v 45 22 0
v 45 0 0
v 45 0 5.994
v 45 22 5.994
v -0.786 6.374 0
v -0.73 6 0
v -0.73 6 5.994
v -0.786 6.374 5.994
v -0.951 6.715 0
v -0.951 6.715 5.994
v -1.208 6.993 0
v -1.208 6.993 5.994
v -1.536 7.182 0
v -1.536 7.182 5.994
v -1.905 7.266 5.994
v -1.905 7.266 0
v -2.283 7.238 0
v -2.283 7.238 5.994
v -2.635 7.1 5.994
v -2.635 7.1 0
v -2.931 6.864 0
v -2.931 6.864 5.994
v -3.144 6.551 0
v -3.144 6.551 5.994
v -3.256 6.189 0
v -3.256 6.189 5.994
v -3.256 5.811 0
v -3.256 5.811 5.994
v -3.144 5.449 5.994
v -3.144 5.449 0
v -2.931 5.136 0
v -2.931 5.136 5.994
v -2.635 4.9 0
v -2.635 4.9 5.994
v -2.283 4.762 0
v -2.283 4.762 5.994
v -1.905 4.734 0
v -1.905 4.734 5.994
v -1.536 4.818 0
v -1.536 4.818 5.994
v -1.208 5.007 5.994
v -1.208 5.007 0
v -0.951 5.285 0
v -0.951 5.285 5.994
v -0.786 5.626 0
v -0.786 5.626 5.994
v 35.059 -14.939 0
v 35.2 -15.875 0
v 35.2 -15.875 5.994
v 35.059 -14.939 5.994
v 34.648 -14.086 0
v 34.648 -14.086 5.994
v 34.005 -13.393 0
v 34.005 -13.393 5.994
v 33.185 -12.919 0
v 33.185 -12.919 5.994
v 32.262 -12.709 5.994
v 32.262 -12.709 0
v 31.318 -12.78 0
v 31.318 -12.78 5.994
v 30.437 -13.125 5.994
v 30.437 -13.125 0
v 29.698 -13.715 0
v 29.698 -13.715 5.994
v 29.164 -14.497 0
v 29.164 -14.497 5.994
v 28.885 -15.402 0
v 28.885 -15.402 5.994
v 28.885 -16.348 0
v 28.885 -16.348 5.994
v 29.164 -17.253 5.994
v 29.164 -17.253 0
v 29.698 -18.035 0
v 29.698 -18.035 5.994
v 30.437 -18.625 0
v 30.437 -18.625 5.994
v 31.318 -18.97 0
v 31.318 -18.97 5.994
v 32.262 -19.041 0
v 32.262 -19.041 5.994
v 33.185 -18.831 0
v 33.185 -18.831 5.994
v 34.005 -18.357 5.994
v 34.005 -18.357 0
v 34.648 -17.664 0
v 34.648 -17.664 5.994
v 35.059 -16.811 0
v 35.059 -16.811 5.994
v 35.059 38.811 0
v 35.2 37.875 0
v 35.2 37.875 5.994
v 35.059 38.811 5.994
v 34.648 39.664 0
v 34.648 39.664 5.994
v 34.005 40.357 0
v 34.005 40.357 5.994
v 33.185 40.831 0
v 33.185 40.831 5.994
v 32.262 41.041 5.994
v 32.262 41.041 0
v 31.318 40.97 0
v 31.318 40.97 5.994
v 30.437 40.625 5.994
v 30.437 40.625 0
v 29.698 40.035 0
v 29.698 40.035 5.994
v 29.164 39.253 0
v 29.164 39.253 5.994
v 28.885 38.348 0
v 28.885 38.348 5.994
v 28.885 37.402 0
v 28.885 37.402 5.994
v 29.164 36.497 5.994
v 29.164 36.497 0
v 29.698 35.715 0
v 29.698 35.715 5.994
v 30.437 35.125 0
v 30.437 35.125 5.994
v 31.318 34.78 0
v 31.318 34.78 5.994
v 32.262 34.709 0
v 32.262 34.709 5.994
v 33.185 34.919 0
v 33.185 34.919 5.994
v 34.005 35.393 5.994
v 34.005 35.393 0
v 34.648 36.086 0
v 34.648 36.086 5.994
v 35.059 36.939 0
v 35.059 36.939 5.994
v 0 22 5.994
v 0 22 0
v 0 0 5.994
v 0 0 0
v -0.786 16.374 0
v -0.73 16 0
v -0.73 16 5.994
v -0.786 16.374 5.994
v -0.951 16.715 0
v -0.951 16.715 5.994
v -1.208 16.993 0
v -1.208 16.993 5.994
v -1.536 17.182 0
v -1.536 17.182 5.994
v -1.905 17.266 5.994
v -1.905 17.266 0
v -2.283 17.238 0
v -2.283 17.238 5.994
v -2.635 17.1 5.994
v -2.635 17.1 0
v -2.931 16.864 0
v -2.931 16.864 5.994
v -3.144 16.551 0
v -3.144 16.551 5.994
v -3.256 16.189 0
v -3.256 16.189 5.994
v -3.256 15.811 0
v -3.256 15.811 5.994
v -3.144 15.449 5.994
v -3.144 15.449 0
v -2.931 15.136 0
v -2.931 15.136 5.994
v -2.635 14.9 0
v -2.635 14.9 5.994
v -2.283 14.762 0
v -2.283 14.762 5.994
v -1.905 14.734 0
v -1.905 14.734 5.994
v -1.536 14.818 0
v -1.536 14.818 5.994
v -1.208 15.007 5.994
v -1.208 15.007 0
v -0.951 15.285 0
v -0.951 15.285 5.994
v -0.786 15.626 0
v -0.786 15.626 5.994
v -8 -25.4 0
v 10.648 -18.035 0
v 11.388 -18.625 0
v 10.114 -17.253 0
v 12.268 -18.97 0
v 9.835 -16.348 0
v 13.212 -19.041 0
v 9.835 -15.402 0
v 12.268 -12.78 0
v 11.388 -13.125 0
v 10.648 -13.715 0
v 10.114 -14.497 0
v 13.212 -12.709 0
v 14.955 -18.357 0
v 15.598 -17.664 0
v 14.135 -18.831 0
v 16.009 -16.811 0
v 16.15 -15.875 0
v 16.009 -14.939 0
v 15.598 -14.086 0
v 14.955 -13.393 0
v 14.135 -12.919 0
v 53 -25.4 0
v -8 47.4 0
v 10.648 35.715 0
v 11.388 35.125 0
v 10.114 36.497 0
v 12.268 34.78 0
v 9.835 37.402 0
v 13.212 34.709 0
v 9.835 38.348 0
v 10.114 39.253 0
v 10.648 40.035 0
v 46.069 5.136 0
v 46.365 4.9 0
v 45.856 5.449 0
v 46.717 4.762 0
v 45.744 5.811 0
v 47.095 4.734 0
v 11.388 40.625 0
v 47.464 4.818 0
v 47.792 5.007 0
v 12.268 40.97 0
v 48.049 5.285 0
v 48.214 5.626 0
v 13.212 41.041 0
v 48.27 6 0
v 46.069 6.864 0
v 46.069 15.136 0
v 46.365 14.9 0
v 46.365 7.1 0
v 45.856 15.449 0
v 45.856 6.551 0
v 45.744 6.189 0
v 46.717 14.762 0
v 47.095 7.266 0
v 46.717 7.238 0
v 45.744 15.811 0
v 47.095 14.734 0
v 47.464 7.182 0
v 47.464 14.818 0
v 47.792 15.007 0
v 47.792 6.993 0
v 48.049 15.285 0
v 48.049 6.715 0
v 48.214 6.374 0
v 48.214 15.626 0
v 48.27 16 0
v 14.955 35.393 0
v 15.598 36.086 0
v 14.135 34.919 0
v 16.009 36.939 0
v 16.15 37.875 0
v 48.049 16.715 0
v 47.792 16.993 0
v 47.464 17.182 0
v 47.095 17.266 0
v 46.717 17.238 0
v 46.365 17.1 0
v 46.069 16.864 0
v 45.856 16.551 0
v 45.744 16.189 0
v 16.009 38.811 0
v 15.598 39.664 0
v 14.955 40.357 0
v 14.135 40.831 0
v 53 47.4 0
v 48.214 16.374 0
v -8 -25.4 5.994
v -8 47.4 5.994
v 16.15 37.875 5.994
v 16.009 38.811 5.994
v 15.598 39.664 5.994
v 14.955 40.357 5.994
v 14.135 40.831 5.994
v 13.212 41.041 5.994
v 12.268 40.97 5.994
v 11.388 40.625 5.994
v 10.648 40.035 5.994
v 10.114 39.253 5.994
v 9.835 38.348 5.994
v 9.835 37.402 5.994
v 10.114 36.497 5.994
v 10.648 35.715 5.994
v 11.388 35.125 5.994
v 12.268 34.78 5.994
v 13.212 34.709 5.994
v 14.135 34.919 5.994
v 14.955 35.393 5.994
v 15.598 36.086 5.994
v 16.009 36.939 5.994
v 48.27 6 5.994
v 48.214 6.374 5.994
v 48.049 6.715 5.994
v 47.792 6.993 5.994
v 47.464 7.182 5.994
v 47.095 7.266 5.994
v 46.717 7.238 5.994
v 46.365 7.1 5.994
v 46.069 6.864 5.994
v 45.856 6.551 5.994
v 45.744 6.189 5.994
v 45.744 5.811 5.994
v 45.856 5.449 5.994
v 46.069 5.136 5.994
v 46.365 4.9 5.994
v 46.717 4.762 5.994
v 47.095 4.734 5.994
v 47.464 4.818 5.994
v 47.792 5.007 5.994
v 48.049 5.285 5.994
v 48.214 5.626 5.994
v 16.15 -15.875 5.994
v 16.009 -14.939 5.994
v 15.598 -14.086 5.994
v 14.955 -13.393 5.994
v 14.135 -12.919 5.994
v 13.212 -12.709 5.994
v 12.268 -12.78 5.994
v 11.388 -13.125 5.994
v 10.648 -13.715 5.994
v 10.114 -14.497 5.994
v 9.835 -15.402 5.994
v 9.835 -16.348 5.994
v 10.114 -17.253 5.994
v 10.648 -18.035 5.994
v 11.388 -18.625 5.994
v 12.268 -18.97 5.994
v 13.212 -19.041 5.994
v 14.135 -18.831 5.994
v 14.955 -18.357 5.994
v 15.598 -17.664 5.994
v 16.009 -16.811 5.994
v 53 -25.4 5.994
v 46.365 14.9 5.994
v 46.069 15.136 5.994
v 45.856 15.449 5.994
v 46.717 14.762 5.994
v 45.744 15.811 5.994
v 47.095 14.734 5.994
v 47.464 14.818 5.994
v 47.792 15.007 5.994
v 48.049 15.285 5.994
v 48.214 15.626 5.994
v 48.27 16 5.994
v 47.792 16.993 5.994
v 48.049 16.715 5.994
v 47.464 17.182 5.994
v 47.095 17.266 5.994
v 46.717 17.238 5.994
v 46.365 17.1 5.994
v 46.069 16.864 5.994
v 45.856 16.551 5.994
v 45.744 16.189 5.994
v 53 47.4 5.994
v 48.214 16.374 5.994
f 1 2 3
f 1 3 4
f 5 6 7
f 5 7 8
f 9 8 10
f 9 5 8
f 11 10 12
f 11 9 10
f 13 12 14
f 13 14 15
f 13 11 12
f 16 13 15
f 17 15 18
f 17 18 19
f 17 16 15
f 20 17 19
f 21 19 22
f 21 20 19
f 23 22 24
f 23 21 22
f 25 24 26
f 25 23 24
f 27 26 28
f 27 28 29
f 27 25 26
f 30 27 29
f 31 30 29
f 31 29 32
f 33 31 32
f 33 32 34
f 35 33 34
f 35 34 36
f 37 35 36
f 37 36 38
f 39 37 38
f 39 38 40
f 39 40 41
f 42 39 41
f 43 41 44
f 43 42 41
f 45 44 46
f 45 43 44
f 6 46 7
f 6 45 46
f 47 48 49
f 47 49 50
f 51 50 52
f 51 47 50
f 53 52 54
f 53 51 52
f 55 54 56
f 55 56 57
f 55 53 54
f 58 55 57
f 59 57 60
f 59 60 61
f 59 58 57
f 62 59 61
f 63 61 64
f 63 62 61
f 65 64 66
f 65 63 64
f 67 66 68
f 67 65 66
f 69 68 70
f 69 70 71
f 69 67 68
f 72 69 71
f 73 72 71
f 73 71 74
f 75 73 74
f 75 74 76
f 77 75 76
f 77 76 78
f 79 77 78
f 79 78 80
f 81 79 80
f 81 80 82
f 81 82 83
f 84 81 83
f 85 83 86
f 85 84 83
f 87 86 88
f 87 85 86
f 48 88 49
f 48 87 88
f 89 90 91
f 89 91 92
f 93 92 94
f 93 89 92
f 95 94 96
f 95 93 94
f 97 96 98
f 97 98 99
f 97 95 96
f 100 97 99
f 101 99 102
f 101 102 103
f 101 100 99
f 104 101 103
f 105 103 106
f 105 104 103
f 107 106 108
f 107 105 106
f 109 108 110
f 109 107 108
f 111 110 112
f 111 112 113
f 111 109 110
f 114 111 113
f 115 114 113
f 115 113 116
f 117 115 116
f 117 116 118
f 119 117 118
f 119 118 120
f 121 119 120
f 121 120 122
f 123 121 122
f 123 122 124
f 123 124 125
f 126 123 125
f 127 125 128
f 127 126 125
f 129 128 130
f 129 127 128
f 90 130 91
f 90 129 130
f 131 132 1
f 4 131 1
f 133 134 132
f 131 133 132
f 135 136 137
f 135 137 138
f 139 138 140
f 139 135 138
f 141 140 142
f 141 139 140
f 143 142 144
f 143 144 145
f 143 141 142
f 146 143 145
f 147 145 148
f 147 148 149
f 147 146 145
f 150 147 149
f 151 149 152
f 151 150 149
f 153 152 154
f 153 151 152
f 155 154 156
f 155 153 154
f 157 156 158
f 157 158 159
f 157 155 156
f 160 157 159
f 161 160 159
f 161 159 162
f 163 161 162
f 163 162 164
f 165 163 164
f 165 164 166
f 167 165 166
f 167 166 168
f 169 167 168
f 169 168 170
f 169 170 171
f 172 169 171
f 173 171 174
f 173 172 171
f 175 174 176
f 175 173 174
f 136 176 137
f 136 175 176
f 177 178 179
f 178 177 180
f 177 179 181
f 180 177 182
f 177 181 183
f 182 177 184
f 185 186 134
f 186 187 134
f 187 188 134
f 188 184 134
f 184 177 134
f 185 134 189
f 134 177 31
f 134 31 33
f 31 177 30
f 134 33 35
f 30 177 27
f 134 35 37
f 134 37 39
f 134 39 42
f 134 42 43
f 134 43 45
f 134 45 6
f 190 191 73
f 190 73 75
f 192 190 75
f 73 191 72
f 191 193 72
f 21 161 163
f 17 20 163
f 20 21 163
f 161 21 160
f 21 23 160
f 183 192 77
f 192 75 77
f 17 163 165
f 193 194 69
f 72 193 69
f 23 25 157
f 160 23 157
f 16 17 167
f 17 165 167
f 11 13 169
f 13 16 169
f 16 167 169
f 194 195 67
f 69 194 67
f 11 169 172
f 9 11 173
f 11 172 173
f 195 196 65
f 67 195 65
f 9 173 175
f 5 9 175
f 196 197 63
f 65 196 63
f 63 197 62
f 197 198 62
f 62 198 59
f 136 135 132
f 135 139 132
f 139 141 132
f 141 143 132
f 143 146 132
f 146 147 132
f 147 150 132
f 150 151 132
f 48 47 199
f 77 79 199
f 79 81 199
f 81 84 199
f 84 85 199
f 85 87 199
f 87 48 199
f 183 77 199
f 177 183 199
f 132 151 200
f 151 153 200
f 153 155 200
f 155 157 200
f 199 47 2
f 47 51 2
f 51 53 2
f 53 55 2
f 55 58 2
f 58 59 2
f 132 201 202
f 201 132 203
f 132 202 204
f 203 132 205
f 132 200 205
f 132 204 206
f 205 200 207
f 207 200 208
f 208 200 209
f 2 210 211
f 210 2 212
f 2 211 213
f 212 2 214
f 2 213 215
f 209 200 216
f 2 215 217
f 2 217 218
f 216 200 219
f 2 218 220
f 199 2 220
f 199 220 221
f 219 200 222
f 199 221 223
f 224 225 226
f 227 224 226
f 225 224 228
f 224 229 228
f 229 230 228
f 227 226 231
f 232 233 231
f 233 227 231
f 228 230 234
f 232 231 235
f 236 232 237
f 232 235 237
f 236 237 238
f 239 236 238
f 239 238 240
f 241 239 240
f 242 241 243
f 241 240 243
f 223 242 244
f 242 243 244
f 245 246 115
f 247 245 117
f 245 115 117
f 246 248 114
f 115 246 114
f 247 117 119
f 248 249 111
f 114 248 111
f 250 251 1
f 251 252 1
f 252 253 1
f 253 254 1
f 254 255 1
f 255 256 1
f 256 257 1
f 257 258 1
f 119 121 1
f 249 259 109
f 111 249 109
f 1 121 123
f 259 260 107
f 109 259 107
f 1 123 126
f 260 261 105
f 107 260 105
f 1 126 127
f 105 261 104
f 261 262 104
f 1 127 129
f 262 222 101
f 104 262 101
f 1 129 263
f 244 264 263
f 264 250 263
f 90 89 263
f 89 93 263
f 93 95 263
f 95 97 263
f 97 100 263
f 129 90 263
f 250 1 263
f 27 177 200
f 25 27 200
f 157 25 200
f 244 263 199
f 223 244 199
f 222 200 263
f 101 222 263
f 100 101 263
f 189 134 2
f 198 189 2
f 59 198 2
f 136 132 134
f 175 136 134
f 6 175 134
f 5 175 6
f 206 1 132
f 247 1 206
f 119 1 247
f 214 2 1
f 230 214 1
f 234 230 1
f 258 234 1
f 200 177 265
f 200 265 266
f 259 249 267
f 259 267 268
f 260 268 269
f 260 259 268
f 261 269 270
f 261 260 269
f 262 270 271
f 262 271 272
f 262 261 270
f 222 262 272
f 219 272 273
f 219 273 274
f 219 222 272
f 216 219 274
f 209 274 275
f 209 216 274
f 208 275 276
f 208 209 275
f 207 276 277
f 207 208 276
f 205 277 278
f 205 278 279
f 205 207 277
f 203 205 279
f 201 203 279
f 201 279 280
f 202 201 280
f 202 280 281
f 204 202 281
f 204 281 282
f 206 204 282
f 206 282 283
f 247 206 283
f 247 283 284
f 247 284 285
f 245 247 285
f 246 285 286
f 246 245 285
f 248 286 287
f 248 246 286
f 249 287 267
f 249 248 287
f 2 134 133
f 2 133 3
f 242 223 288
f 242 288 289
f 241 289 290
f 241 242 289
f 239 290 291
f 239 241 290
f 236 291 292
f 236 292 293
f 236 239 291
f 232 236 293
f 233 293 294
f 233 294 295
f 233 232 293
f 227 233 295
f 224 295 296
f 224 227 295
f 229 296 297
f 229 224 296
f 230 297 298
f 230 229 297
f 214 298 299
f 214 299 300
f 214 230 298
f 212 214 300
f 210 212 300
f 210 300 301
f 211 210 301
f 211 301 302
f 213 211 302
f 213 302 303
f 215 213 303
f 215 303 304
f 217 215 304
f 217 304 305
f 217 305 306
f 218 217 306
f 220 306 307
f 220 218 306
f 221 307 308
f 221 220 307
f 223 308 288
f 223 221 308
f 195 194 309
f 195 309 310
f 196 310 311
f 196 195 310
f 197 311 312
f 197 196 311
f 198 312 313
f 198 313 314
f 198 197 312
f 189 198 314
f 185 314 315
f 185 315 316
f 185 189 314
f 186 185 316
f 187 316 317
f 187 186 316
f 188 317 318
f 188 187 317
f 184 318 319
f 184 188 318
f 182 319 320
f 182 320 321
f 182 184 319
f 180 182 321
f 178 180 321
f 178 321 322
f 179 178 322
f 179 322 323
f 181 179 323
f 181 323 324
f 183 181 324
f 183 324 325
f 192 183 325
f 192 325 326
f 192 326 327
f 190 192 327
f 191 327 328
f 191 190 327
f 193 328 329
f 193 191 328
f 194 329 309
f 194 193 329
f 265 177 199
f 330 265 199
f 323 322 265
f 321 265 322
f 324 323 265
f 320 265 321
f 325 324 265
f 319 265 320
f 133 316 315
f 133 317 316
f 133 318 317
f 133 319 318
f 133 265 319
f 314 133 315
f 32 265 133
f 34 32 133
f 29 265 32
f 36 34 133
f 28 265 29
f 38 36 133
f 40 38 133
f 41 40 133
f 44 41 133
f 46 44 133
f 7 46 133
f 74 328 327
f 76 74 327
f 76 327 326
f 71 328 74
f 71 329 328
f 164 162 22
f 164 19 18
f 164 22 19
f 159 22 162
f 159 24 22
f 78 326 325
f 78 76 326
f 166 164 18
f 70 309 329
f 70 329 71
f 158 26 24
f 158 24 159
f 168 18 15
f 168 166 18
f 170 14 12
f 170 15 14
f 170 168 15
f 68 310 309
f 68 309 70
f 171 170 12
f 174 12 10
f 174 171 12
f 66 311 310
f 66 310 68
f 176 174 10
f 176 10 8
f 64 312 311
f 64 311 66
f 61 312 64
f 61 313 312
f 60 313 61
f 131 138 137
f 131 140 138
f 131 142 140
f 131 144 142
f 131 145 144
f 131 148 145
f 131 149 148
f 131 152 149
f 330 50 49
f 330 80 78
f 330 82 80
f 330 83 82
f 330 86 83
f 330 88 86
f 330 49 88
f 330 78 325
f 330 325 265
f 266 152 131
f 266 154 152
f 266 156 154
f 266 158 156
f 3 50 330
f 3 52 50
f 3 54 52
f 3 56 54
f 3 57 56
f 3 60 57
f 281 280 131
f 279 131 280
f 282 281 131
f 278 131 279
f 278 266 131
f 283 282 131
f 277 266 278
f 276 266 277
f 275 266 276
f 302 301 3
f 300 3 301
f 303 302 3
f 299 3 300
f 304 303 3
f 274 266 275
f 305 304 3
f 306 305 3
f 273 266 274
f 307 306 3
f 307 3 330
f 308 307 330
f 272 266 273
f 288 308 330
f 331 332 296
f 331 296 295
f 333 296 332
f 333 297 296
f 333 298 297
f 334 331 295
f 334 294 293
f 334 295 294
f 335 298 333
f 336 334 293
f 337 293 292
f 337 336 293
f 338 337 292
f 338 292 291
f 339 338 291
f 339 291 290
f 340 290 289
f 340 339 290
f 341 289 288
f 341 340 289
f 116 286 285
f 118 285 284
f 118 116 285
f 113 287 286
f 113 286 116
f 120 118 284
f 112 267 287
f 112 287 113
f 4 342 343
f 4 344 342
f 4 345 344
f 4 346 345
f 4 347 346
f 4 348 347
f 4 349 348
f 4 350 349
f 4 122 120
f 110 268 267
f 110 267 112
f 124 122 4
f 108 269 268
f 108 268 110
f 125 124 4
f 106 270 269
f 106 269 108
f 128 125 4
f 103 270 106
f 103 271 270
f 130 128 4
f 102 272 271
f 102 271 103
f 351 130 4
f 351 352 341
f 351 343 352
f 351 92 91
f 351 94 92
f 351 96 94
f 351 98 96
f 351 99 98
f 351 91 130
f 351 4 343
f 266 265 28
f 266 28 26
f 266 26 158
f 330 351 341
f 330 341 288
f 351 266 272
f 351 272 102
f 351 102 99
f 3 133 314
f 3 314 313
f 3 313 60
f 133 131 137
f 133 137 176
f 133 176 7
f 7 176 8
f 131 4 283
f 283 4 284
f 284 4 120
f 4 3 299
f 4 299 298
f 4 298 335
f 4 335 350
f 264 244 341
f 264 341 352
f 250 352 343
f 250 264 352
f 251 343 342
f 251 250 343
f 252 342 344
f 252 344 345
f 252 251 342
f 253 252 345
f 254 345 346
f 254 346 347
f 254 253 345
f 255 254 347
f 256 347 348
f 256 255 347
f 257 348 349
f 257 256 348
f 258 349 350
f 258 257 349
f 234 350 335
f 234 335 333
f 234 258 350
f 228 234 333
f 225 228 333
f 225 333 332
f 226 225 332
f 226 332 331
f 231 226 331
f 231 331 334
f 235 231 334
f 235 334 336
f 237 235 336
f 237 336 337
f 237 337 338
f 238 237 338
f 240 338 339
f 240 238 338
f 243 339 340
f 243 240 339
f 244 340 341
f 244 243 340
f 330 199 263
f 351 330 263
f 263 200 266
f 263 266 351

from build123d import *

# Parameters (mm, degrees)
SKETCH1_W           = 61
SKETCH1_H           = 72.8
SKETCH1_R           = 1.27
SKETCH1_R_2         = 3.175
SKETCH1_W_2         = 45
SKETCH1_H_2         = 22
BOSS_EXTRUDE1_DEPTH = 5.9944


with BuildPart() as part:
    # Sketch1 → Boss-Extrude1 (new body)
    with BuildSketch(Plane.XY):
        with Locations((22.5, 11)):
            Rectangle(SKETCH1_W, SKETCH1_H)
        with Locations((-2, 16)):
            Circle(SKETCH1_R, mode=Mode.SUBTRACT)
        with Locations((-2, 6)):
            Circle(SKETCH1_R, mode=Mode.SUBTRACT)
        with Locations((47, 16)):
            Circle(SKETCH1_R, mode=Mode.SUBTRACT)
        with Locations((47, 6)):
            Circle(SKETCH1_R, mode=Mode.SUBTRACT)
        with Locations((12.975, -15.875)):
            Circle(SKETCH1_R_2, mode=Mode.SUBTRACT)
        with Locations((12.975, 37.875)):
            Circle(SKETCH1_R_2, mode=Mode.SUBTRACT)
        with Locations((32.025, 37.875)):
            Circle(SKETCH1_R_2, mode=Mode.SUBTRACT)
        with Locations((32.025, -15.875)):
            Circle(SKETCH1_R_2, mode=Mode.SUBTRACT)
        with Locations((22.5, 11)):
            Rectangle(SKETCH1_W_2, SKETCH1_H_2, mode=Mode.SUBTRACT)
    extrude(amount=BOSS_EXTRUDE1_DEPTH)


solid = part.part
